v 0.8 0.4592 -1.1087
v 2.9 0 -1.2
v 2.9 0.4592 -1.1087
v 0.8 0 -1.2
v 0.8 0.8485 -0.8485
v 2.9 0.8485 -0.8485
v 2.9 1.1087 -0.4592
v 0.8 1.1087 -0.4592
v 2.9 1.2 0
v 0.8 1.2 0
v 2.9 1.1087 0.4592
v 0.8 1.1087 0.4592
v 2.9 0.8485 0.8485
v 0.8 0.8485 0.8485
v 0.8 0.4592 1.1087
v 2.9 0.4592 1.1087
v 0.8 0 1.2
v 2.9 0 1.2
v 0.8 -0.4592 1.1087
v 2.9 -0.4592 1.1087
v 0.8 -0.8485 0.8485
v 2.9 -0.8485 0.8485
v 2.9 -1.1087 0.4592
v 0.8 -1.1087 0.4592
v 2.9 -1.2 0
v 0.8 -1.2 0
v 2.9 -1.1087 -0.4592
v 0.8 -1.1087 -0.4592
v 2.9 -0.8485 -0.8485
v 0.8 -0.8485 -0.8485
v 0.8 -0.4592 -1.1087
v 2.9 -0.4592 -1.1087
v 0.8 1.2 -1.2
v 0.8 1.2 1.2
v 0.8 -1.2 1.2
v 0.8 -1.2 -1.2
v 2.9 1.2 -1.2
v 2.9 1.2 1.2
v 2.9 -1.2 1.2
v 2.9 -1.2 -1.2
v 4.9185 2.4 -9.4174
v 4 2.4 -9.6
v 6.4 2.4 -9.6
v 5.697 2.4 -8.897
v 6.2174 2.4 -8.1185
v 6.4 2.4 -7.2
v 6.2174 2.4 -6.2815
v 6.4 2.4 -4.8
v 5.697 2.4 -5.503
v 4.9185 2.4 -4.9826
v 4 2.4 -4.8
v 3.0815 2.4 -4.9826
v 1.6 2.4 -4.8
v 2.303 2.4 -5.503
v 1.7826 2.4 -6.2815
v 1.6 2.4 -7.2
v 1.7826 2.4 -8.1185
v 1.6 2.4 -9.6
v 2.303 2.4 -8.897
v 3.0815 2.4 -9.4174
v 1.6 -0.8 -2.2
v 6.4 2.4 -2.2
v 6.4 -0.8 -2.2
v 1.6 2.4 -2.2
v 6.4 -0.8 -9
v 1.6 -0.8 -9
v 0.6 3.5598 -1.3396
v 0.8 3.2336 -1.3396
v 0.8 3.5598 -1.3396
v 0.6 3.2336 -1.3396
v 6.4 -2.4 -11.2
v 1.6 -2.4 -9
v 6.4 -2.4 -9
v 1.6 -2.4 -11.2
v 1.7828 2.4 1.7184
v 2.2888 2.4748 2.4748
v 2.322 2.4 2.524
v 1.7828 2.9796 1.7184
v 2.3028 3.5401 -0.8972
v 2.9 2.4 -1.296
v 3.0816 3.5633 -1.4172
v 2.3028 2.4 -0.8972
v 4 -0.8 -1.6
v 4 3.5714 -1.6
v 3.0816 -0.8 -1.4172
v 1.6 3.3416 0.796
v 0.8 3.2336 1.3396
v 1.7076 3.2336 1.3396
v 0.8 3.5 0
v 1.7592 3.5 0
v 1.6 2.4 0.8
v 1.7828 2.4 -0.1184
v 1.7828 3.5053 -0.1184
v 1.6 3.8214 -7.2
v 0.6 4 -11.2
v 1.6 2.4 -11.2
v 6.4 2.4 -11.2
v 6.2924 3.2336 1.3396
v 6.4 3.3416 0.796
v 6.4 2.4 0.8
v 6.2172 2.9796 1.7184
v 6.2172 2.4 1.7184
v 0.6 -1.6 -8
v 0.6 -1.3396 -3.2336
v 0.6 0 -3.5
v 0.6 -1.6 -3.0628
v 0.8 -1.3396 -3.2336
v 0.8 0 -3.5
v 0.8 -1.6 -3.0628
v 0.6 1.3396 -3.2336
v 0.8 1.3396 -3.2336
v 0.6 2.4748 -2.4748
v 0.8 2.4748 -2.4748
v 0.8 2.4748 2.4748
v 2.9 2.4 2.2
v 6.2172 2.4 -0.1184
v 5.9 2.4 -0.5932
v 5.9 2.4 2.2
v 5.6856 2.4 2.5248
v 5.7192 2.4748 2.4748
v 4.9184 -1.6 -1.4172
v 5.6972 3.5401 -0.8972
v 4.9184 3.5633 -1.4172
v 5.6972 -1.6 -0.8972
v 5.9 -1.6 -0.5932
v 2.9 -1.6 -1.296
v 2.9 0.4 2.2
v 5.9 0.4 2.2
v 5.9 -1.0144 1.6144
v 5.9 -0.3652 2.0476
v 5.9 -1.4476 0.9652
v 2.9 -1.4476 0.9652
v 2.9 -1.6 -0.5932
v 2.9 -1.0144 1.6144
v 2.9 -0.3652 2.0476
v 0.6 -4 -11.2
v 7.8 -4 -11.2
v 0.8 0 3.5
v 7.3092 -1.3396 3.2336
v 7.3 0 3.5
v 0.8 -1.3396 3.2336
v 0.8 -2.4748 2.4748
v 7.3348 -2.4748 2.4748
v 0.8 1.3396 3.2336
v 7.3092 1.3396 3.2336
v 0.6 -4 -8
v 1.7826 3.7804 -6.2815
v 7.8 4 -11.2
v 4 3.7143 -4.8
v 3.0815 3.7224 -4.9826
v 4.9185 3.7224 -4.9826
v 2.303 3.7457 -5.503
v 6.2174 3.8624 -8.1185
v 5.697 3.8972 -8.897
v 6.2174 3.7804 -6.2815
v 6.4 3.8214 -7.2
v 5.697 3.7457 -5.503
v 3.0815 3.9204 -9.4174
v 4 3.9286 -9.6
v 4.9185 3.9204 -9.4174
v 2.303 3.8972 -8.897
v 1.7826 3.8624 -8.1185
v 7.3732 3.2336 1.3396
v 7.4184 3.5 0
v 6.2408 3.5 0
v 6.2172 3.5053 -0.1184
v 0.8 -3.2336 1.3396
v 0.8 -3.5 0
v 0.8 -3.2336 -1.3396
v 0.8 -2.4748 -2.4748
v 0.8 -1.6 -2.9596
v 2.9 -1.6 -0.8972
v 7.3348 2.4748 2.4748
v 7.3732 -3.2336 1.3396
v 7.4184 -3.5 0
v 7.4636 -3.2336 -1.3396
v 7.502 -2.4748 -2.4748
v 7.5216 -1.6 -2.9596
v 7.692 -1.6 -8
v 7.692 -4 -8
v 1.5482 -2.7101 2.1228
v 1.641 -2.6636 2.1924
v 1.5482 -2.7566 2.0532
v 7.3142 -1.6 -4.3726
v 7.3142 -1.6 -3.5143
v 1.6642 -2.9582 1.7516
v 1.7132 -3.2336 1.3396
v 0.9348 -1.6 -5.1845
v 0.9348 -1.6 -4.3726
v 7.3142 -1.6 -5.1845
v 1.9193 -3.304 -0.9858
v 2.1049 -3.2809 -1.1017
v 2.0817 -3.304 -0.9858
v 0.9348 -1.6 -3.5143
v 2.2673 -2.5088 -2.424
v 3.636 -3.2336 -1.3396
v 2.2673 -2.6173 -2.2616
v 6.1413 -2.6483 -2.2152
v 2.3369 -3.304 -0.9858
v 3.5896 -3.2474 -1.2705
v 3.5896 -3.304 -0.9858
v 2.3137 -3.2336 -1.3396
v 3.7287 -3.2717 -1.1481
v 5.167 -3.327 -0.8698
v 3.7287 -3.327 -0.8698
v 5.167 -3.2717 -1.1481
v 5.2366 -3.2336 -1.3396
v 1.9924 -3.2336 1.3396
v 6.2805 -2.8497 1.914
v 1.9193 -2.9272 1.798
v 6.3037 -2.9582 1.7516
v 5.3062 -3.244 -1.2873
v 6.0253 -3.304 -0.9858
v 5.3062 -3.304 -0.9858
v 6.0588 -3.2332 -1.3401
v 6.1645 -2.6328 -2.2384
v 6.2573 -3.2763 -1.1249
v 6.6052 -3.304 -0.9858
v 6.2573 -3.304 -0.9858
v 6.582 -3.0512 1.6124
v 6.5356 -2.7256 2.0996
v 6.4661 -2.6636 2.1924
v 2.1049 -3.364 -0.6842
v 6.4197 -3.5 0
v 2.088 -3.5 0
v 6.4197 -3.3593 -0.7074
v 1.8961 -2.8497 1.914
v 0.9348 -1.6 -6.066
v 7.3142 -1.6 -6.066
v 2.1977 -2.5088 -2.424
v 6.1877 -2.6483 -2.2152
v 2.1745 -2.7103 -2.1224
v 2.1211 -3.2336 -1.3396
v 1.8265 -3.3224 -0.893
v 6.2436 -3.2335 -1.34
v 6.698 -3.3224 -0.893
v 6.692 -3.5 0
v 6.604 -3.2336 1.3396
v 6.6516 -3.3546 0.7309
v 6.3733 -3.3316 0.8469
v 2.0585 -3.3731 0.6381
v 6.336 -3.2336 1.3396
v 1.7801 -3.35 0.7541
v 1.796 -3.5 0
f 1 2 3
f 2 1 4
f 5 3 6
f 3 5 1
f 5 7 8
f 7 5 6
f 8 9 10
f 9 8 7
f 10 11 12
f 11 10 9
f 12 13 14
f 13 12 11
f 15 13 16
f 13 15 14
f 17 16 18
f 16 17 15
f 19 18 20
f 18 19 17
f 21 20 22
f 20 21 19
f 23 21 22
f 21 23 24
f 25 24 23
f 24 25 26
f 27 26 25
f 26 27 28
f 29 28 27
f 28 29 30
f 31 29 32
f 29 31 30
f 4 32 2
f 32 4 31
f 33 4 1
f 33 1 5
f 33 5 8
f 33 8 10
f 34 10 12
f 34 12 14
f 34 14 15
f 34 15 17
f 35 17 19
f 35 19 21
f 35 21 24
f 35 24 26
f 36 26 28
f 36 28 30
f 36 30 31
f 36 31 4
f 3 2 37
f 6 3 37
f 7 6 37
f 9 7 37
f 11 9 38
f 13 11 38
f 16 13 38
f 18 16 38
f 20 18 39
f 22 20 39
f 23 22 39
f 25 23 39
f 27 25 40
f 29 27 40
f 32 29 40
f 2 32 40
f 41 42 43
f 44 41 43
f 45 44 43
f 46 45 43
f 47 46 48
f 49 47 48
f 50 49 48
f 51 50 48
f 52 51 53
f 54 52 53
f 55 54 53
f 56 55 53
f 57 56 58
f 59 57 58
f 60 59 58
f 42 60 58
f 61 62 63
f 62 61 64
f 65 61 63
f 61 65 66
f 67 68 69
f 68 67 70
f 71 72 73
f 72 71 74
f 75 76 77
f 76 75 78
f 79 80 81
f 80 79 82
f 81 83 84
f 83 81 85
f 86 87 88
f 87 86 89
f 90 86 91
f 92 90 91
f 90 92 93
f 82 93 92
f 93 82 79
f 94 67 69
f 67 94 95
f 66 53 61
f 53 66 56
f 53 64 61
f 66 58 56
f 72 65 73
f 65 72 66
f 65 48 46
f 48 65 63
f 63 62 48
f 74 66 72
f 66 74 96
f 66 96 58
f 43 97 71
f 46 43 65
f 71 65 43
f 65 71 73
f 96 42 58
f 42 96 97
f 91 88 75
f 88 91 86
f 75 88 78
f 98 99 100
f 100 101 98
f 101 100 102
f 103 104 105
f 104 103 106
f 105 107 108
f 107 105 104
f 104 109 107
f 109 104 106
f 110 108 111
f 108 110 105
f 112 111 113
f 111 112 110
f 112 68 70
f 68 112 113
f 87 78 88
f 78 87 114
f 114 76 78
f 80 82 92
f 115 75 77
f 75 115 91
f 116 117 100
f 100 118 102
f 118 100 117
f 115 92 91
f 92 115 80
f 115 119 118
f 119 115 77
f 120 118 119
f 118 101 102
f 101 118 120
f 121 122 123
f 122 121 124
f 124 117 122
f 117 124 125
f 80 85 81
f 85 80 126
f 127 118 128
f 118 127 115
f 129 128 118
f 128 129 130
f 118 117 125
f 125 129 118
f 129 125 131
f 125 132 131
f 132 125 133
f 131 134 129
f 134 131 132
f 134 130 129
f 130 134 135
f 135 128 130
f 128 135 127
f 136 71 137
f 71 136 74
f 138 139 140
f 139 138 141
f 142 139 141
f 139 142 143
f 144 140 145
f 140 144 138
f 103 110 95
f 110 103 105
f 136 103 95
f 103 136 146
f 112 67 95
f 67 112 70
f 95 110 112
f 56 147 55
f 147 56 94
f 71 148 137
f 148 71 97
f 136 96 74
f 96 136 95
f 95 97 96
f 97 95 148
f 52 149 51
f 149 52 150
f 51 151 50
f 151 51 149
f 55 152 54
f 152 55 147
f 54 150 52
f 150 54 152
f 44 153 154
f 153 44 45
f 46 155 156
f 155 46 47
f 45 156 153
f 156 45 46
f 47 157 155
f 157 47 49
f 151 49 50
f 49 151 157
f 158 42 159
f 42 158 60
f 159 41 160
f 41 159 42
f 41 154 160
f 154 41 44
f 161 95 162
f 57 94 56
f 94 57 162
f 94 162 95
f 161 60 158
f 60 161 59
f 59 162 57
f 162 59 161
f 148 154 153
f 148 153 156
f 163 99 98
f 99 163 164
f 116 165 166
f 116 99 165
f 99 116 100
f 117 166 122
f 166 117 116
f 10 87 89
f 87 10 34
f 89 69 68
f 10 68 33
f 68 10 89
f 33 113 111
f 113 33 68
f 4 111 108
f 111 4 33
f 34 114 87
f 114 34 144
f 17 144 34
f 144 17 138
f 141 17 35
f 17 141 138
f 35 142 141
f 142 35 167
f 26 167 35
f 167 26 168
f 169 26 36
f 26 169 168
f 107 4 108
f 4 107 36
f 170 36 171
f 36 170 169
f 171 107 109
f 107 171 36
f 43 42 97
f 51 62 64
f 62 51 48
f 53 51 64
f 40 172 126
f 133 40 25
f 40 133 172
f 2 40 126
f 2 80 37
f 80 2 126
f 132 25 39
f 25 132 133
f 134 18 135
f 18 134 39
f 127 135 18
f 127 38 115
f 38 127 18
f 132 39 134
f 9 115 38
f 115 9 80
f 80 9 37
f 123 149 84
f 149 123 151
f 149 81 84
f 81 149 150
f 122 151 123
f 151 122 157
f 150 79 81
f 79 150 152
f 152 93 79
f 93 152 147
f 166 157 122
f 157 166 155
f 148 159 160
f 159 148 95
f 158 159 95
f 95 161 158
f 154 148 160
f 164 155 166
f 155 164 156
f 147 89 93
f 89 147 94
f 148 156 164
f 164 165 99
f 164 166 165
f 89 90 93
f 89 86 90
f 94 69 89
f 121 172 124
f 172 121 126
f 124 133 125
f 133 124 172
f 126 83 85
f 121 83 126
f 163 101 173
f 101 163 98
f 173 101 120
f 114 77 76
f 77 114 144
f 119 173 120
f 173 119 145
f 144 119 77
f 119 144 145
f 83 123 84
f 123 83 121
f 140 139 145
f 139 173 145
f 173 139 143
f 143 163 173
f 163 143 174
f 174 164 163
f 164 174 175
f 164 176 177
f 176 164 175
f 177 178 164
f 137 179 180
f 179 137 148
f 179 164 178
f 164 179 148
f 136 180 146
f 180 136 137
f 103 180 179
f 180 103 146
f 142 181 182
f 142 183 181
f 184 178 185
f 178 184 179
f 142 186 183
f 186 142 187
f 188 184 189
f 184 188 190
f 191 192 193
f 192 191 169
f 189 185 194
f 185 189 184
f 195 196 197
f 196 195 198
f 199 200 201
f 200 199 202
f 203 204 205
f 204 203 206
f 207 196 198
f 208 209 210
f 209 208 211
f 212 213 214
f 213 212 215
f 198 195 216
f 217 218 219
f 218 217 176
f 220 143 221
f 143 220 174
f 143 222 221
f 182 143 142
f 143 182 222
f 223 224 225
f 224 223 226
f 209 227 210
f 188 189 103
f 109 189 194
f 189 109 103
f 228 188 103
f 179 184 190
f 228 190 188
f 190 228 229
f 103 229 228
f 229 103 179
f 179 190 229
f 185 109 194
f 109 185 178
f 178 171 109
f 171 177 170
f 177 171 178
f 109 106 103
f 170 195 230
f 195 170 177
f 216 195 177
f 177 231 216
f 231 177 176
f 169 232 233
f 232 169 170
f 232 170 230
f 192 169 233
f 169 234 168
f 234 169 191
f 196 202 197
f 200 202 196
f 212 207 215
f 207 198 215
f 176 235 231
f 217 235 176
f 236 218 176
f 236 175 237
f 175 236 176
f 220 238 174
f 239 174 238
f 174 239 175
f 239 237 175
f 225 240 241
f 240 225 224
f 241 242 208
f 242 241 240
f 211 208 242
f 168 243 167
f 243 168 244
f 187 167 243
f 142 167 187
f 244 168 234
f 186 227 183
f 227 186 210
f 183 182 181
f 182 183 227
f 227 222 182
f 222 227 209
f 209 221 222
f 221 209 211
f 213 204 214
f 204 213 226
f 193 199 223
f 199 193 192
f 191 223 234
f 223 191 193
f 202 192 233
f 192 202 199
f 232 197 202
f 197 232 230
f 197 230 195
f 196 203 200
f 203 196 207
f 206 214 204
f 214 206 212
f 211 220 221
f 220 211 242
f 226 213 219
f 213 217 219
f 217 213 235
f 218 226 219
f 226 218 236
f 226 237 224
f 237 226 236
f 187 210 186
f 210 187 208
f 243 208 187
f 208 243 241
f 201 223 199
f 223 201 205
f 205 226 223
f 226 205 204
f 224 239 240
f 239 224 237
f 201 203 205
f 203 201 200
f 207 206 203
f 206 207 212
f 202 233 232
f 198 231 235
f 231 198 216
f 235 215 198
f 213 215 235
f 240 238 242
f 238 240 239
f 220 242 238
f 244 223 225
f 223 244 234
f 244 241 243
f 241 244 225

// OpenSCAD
use <../lib.scad>
use <s/3817bp70s01.scad>
use <s/3817bp70s02.scad>
function ldraw_lib__3817bp70() = [
// 0 Minifig Leg Left with Reflective Stripes and Black Pocket Outline Pattern
// 0 Name: 3817bp70.dat
// 0 Author: Philippe Hurbain [Philo]
// 0 !LDRAW_ORG Part UPDATE 2020-01
// 0 !LICENSE Licensed under CC BY 4.0 : see CAreadme.txt
// 
// 0 BFC CERTIFY CCW
  [0,"BFC","CERTIFY"],
  [0,"BFC","CCW"],
// 
// 0 !KEYWORDS Bricklink 970c00pb0901
// 
// 0 !HISTORY 2020-06-28 [PTadmin] Official Update 2020-01
// 
// 
// 1 16 0 0 0 1 0 0 0 1 0 0 0 1 s\3817bp70s01.dat
  [1,16,0,0,0,1,0,0,0,1,0,0,0,1, ldraw_lib__s__3817bp70s01()],
// 1 0 0 0 0 1 0 0 0 1 0 0 0 1 s\3817bp70s02.dat
  [1,0,0,0,0,1,0,0,0,1,0,0,0,1, ldraw_lib__s__3817bp70s02()],
];
module ldraw_lib__3817bp70(step=0, col=false, unit=2/5, alt=false, line=0.2, solid=!$preview)
    makepoly(ldraw_lib__3817bp70(), step=step, col=col, unit=unit, alt=alt, line=line, solid=solid);
ldraw_lib__3817bp70(line=0.2);
